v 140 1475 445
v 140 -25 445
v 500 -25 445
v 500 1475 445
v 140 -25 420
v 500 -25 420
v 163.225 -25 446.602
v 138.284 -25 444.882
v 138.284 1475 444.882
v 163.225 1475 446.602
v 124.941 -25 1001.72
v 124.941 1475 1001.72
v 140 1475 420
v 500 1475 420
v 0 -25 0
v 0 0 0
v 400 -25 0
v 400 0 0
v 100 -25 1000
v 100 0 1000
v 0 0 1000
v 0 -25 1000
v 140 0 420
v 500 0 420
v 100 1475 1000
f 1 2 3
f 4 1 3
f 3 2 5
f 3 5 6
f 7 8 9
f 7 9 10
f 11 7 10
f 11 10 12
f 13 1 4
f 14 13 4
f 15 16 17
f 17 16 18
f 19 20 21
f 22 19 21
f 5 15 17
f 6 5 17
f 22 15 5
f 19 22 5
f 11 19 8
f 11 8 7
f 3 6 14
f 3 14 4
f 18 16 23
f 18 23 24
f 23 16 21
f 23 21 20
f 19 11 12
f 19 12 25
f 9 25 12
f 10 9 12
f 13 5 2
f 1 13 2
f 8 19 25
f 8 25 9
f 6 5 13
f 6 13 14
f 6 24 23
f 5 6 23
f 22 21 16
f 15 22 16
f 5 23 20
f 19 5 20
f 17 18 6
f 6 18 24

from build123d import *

# Parameters (mm, degrees)
F1_DEPTH = 25
F2_W     = 360
F2_H     = 25
F3_DEPTH = 1500
F5_DEPTH = 1500


with BuildPart() as f1:
    # F0 (on Front) → F1 (new body)
    with BuildSketch(Plane.XZ):
        Polygon((0, 1000), (0, 0), (400, 0), (500, 420), (140, 420), (100, 1000), align=None)
    extrude(amount=F1_DEPTH)


with BuildPart() as f3:
    # F2 (on face) → F3 (new body)
    with BuildSketch(Plane.XZ.offset(25)):
        with Locations((320, 432.5)):
            Rectangle(F2_W, F2_H)
    extrude(amount=-F3_DEPTH)


with BuildPart() as f5:
    # F4 (on face) → F5 (new body)
    with BuildSketch(Plane.XZ.offset(25)):
        Polygon((124.940758, 1001.720052), (100, 1000), (138.284024, 444.881657), (163.224782, 446.601709), align=None)
    extrude(amount=-F5_DEPTH)


solid = Compound([f1.part, f3.part, f5.part])
